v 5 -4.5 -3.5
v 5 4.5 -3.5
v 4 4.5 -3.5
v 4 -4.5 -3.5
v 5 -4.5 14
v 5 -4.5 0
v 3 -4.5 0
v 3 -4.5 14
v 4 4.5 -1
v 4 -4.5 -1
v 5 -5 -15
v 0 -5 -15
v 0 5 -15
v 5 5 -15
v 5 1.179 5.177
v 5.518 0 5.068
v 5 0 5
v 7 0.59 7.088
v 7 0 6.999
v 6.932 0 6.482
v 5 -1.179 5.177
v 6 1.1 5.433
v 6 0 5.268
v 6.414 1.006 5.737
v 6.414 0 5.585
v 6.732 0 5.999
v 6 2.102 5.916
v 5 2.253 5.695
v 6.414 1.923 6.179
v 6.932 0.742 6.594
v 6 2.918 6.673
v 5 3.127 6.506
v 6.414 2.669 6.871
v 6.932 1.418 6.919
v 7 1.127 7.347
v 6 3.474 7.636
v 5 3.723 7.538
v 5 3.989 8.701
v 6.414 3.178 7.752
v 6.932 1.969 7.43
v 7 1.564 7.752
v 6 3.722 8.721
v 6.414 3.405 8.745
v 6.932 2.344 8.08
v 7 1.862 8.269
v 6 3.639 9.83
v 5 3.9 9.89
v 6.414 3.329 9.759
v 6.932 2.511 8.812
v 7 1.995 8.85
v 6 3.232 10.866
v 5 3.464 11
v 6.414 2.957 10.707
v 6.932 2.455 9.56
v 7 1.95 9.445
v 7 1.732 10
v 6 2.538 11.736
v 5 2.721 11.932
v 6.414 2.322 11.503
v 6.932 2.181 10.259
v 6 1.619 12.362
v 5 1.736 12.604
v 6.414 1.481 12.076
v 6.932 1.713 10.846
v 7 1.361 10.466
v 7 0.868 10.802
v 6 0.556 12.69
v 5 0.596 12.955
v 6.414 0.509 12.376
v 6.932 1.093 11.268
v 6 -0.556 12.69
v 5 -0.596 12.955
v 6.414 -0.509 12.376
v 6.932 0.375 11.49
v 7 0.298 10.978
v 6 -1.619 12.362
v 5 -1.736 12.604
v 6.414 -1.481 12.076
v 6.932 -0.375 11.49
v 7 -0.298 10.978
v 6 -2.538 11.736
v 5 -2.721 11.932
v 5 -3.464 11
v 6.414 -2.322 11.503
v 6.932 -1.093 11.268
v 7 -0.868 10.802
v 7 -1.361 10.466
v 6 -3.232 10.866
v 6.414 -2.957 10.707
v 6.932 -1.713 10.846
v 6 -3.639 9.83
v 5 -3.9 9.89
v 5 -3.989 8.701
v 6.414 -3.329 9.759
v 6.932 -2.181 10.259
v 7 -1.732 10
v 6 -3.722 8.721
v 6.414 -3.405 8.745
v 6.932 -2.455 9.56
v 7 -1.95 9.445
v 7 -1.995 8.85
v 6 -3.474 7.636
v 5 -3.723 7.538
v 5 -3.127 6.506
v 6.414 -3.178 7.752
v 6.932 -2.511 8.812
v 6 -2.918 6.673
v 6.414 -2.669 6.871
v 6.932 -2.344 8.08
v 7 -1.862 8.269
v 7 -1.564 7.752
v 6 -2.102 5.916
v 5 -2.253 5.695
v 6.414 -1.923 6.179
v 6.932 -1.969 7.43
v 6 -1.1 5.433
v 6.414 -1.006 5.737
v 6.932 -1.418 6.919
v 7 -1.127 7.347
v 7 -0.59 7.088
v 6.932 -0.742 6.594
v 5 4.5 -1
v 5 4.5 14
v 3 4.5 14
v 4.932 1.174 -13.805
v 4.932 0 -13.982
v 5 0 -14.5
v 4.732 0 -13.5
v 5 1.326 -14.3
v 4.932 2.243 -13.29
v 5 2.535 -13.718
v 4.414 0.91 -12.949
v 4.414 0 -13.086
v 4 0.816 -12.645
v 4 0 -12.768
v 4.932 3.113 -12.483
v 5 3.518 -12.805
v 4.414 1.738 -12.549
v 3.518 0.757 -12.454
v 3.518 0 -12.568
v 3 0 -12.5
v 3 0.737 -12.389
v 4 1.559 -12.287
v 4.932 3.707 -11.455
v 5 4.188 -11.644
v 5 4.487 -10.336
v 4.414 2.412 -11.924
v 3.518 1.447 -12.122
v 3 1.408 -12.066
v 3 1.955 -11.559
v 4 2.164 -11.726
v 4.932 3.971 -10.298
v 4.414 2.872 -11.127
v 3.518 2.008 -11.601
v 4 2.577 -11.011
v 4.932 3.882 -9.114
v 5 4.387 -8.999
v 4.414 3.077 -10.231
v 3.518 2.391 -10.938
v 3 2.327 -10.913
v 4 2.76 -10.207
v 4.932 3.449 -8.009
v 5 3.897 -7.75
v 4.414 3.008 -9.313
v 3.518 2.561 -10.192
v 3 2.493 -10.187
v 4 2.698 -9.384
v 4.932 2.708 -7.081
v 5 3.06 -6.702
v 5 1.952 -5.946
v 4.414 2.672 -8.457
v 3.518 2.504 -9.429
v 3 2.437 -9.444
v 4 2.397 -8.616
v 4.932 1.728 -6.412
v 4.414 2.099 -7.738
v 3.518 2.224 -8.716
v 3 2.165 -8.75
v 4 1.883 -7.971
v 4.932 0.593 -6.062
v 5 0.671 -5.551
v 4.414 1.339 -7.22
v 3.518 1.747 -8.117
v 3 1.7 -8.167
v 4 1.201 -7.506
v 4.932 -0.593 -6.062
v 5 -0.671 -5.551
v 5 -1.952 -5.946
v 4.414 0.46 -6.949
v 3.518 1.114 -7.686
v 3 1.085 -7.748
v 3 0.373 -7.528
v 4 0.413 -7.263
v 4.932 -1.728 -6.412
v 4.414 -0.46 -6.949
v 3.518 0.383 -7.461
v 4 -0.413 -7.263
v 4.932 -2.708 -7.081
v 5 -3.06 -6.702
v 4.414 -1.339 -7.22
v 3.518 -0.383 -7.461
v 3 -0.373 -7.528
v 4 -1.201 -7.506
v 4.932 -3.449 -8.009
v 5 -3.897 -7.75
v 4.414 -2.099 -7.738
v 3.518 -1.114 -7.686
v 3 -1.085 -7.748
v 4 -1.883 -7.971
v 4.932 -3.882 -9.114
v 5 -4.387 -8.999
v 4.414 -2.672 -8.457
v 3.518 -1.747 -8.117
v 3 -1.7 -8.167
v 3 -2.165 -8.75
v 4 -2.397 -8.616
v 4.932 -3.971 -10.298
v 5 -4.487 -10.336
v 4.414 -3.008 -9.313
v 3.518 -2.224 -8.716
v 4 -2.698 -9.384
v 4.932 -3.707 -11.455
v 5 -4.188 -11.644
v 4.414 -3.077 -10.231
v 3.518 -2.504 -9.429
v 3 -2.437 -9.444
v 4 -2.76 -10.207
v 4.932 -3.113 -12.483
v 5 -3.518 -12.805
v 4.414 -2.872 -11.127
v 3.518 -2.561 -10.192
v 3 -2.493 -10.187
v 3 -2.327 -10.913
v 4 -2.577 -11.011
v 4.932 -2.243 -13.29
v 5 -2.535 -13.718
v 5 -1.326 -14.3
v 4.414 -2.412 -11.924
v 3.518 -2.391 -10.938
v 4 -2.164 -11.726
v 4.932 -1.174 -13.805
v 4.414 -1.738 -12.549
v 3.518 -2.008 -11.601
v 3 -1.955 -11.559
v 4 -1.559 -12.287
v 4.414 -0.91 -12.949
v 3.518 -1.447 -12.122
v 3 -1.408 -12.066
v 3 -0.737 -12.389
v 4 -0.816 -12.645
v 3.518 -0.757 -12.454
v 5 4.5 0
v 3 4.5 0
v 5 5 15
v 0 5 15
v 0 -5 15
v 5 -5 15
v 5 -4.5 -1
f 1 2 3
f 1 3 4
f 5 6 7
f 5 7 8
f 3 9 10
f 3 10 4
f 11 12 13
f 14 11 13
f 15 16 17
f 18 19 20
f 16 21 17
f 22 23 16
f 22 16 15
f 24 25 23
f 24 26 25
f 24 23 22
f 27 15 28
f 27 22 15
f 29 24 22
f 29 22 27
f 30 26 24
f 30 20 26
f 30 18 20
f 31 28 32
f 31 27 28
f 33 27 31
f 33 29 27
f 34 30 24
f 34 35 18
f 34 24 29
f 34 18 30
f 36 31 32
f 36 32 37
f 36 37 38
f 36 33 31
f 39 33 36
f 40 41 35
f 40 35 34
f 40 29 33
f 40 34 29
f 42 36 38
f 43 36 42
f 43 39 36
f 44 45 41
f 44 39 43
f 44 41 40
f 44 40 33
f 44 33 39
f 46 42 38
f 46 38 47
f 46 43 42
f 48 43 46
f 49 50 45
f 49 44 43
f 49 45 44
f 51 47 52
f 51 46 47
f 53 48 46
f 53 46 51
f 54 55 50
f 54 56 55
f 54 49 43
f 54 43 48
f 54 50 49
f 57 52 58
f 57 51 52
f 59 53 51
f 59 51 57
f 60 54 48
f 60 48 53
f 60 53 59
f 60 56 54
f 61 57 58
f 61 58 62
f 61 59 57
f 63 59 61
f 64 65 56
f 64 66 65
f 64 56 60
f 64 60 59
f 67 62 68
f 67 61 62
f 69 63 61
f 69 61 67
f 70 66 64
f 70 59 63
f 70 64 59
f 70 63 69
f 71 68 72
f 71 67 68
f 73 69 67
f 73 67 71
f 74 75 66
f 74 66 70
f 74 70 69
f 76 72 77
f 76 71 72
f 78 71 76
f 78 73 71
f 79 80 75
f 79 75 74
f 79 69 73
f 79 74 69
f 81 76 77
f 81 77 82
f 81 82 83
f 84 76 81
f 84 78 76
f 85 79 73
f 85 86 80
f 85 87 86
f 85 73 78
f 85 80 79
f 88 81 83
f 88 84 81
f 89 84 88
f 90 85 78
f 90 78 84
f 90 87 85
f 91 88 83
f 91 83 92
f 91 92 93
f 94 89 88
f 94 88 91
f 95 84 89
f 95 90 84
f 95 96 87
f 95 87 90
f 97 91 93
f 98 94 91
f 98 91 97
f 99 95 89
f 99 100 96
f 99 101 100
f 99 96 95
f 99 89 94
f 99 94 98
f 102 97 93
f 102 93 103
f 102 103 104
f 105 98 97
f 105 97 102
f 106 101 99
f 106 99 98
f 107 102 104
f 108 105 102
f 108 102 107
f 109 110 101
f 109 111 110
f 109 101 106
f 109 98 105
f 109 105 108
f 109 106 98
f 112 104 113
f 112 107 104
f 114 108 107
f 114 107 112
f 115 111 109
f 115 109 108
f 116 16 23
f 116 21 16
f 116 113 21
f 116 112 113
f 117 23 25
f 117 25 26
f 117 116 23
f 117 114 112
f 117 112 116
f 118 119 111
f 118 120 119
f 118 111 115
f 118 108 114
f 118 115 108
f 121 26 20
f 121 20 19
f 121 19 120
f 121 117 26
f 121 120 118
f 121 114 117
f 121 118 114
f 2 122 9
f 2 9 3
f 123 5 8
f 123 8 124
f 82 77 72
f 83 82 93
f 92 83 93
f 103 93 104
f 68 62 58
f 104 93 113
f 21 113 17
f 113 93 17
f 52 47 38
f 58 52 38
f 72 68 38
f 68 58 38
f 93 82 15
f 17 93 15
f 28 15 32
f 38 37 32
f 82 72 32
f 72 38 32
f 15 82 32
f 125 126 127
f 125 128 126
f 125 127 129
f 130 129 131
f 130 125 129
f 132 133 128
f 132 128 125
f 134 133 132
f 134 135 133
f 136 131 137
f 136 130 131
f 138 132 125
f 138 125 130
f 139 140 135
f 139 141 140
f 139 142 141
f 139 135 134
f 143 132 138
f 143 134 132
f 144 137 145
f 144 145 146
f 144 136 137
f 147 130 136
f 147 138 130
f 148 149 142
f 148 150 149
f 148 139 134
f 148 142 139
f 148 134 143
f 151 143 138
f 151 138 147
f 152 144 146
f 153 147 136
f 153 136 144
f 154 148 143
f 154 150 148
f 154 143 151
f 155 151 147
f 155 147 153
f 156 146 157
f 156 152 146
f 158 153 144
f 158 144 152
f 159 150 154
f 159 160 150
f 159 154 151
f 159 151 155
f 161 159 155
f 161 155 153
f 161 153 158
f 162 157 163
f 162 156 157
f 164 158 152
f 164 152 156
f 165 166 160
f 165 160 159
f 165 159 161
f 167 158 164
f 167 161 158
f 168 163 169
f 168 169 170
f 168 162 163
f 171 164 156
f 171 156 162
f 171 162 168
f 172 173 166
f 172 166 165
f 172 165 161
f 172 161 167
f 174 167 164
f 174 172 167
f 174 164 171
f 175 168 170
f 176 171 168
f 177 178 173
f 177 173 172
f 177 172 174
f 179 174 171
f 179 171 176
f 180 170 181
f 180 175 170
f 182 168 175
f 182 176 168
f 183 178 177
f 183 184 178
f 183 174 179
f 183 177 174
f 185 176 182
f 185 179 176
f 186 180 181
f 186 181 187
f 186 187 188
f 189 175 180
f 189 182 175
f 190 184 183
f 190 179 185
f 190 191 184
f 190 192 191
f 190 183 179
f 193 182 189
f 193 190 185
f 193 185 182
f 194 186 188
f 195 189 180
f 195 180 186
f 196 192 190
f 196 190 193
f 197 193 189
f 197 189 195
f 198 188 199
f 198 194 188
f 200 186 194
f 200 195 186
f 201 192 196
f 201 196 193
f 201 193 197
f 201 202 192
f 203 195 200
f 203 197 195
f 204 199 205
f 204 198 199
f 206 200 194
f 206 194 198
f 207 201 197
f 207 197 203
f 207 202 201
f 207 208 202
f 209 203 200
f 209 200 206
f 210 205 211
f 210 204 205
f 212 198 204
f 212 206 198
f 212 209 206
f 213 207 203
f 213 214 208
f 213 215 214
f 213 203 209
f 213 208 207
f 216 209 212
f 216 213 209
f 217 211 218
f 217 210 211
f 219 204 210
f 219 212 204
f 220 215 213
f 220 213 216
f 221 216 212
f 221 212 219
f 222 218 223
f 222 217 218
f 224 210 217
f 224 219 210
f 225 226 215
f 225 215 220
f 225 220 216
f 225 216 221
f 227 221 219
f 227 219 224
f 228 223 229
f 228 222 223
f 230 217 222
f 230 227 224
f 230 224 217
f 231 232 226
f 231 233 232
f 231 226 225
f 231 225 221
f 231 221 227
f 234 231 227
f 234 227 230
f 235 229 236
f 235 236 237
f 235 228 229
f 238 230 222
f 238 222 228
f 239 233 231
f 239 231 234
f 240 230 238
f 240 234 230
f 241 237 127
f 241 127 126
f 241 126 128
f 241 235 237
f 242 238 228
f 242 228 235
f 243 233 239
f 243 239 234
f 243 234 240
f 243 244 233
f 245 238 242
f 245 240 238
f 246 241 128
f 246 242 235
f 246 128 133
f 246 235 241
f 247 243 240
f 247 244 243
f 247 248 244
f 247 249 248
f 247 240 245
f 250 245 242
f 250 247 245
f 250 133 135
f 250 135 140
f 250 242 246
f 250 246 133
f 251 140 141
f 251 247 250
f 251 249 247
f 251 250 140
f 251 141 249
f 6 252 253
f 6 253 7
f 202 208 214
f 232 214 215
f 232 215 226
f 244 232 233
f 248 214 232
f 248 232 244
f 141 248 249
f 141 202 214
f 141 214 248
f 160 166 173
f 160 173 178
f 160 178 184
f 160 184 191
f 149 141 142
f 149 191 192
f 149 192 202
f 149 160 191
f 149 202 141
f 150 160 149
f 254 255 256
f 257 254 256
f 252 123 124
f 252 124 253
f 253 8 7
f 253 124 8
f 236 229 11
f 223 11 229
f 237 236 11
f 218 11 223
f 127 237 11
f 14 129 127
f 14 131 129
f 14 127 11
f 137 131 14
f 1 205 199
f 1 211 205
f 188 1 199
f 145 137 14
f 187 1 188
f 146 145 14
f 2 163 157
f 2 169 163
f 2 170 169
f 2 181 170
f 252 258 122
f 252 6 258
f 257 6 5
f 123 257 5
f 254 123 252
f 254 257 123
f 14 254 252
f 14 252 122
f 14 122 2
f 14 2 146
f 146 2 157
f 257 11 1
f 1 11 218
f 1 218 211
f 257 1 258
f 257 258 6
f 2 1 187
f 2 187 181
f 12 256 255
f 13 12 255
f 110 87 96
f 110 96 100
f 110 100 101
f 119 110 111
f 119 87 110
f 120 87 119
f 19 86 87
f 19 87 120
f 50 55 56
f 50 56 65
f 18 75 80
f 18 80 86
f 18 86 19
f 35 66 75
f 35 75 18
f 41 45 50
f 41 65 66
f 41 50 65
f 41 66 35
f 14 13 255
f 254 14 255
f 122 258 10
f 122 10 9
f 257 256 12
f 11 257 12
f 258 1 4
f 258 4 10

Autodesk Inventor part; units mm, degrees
ref_plane "YZ Plane" through (0, 0, 0) normal (1, 0, 0) x (0, 1, 0)
ref_plane "XZ Plane" through (0, 0, 0) normal (0, 1, 0) x (-1, 0, 0)
ref_plane "XY Plane" through (0, 0, 0) normal (0, 0, 1) x (1, 0, 0)
sketch "草图1" plane through (0, 0, 0) normal (1, 0, 0) x (0, 1, 0)
  line L0 (5, 15) -> (-5, 15)
  line L1 (-5, 15) -> (-5, -15)
  line L2 (-5, -15) -> (5, -15)
  line L3 (5, -15) -> (5, 15)
  point P0 (0, 0)
  dimension "d0" = 10
  dimension "d1" = 30
extrude "拉伸1" add sketch "草图1" along normal blind 5
sketch "草图2" plane through (5, 0, 0) normal (1, 0, 0) x (0, 0, -1)
  line L0 (1, 4.5) -> (3.5, 4.5)
  line L1 (3.5, 4.5) -> (3.5, -4.5)
  line L2 (3.5, -4.5) -> (1, -4.5)
  line L3 (1, -4.5) -> (1, 4.5)
  point P0 (0, 0)
  dimension "d4" = 2.5
  dimension "d5" = 9
extrude "拉伸2" cut sketch "草图2" against normal blind 1
sketch "草图3" plane through (5, 0, 0) normal (1, 0, 0) x (0, 0, -1)
  circle A0 centre (10, 0) radius 2.5
  point P0 (0, 0)
  dimension "d8" = 5
extrude "拉伸3" cut sketch "草图3" against normal blind 2
fillet "圆角1" radius 2 1 edges at (5, 0, -7.5)
sketch "草图4" plane through (5, 0, 0) normal (1, 0, 0) x (0, 0, -1)
  line L0 (-14, 4.5) -> (0, 4.5)
  line L1 (0, 4.5) -> (0, -4.5)
  line L2 (0, -4.5) -> (-14, -4.5)
  line L3 (-14, -4.5) -> (-14, 4.5)
  circle A0 centre (-8.9997, 0) radius 4
  line L4 (-14, 4.5) -> (0, 4.5)
  line L5 (0, 4.5) -> (0, -4.5)
  line L6 (0, -4.5) -> (-14, -4.5)
  line L7 (-14, -4.5) -> (-14, 4.5)
  point P0 (0, 0)
  dimension "d12" = 9
  dimension "d13" = 8
sketch "草图5" plane through (5, 0, 0) normal (1, 0, 0) x (0, 0, -1)
  line L0 (-14, 4.5) -> (0, 4.5)
  line L1 (0, 4.5) -> (0, -4.5)
  line L2 (0, -4.5) -> (-14, -4.5)
  line L3 (-14, -4.5) -> (-14, 4.5)
  point P0 (0, 0)
  dimension "d14" = 14
  dimension "d15" = 9
extrude "拉伸4" cut sketch "草图5" against normal blind 2
extrude "拉伸5" add sketch "草图4" along normal blind 2 contours A0
fillet "圆角2" radius 2 1 edges at (7, 0, 12.9997)
properties part number "红外测距"
